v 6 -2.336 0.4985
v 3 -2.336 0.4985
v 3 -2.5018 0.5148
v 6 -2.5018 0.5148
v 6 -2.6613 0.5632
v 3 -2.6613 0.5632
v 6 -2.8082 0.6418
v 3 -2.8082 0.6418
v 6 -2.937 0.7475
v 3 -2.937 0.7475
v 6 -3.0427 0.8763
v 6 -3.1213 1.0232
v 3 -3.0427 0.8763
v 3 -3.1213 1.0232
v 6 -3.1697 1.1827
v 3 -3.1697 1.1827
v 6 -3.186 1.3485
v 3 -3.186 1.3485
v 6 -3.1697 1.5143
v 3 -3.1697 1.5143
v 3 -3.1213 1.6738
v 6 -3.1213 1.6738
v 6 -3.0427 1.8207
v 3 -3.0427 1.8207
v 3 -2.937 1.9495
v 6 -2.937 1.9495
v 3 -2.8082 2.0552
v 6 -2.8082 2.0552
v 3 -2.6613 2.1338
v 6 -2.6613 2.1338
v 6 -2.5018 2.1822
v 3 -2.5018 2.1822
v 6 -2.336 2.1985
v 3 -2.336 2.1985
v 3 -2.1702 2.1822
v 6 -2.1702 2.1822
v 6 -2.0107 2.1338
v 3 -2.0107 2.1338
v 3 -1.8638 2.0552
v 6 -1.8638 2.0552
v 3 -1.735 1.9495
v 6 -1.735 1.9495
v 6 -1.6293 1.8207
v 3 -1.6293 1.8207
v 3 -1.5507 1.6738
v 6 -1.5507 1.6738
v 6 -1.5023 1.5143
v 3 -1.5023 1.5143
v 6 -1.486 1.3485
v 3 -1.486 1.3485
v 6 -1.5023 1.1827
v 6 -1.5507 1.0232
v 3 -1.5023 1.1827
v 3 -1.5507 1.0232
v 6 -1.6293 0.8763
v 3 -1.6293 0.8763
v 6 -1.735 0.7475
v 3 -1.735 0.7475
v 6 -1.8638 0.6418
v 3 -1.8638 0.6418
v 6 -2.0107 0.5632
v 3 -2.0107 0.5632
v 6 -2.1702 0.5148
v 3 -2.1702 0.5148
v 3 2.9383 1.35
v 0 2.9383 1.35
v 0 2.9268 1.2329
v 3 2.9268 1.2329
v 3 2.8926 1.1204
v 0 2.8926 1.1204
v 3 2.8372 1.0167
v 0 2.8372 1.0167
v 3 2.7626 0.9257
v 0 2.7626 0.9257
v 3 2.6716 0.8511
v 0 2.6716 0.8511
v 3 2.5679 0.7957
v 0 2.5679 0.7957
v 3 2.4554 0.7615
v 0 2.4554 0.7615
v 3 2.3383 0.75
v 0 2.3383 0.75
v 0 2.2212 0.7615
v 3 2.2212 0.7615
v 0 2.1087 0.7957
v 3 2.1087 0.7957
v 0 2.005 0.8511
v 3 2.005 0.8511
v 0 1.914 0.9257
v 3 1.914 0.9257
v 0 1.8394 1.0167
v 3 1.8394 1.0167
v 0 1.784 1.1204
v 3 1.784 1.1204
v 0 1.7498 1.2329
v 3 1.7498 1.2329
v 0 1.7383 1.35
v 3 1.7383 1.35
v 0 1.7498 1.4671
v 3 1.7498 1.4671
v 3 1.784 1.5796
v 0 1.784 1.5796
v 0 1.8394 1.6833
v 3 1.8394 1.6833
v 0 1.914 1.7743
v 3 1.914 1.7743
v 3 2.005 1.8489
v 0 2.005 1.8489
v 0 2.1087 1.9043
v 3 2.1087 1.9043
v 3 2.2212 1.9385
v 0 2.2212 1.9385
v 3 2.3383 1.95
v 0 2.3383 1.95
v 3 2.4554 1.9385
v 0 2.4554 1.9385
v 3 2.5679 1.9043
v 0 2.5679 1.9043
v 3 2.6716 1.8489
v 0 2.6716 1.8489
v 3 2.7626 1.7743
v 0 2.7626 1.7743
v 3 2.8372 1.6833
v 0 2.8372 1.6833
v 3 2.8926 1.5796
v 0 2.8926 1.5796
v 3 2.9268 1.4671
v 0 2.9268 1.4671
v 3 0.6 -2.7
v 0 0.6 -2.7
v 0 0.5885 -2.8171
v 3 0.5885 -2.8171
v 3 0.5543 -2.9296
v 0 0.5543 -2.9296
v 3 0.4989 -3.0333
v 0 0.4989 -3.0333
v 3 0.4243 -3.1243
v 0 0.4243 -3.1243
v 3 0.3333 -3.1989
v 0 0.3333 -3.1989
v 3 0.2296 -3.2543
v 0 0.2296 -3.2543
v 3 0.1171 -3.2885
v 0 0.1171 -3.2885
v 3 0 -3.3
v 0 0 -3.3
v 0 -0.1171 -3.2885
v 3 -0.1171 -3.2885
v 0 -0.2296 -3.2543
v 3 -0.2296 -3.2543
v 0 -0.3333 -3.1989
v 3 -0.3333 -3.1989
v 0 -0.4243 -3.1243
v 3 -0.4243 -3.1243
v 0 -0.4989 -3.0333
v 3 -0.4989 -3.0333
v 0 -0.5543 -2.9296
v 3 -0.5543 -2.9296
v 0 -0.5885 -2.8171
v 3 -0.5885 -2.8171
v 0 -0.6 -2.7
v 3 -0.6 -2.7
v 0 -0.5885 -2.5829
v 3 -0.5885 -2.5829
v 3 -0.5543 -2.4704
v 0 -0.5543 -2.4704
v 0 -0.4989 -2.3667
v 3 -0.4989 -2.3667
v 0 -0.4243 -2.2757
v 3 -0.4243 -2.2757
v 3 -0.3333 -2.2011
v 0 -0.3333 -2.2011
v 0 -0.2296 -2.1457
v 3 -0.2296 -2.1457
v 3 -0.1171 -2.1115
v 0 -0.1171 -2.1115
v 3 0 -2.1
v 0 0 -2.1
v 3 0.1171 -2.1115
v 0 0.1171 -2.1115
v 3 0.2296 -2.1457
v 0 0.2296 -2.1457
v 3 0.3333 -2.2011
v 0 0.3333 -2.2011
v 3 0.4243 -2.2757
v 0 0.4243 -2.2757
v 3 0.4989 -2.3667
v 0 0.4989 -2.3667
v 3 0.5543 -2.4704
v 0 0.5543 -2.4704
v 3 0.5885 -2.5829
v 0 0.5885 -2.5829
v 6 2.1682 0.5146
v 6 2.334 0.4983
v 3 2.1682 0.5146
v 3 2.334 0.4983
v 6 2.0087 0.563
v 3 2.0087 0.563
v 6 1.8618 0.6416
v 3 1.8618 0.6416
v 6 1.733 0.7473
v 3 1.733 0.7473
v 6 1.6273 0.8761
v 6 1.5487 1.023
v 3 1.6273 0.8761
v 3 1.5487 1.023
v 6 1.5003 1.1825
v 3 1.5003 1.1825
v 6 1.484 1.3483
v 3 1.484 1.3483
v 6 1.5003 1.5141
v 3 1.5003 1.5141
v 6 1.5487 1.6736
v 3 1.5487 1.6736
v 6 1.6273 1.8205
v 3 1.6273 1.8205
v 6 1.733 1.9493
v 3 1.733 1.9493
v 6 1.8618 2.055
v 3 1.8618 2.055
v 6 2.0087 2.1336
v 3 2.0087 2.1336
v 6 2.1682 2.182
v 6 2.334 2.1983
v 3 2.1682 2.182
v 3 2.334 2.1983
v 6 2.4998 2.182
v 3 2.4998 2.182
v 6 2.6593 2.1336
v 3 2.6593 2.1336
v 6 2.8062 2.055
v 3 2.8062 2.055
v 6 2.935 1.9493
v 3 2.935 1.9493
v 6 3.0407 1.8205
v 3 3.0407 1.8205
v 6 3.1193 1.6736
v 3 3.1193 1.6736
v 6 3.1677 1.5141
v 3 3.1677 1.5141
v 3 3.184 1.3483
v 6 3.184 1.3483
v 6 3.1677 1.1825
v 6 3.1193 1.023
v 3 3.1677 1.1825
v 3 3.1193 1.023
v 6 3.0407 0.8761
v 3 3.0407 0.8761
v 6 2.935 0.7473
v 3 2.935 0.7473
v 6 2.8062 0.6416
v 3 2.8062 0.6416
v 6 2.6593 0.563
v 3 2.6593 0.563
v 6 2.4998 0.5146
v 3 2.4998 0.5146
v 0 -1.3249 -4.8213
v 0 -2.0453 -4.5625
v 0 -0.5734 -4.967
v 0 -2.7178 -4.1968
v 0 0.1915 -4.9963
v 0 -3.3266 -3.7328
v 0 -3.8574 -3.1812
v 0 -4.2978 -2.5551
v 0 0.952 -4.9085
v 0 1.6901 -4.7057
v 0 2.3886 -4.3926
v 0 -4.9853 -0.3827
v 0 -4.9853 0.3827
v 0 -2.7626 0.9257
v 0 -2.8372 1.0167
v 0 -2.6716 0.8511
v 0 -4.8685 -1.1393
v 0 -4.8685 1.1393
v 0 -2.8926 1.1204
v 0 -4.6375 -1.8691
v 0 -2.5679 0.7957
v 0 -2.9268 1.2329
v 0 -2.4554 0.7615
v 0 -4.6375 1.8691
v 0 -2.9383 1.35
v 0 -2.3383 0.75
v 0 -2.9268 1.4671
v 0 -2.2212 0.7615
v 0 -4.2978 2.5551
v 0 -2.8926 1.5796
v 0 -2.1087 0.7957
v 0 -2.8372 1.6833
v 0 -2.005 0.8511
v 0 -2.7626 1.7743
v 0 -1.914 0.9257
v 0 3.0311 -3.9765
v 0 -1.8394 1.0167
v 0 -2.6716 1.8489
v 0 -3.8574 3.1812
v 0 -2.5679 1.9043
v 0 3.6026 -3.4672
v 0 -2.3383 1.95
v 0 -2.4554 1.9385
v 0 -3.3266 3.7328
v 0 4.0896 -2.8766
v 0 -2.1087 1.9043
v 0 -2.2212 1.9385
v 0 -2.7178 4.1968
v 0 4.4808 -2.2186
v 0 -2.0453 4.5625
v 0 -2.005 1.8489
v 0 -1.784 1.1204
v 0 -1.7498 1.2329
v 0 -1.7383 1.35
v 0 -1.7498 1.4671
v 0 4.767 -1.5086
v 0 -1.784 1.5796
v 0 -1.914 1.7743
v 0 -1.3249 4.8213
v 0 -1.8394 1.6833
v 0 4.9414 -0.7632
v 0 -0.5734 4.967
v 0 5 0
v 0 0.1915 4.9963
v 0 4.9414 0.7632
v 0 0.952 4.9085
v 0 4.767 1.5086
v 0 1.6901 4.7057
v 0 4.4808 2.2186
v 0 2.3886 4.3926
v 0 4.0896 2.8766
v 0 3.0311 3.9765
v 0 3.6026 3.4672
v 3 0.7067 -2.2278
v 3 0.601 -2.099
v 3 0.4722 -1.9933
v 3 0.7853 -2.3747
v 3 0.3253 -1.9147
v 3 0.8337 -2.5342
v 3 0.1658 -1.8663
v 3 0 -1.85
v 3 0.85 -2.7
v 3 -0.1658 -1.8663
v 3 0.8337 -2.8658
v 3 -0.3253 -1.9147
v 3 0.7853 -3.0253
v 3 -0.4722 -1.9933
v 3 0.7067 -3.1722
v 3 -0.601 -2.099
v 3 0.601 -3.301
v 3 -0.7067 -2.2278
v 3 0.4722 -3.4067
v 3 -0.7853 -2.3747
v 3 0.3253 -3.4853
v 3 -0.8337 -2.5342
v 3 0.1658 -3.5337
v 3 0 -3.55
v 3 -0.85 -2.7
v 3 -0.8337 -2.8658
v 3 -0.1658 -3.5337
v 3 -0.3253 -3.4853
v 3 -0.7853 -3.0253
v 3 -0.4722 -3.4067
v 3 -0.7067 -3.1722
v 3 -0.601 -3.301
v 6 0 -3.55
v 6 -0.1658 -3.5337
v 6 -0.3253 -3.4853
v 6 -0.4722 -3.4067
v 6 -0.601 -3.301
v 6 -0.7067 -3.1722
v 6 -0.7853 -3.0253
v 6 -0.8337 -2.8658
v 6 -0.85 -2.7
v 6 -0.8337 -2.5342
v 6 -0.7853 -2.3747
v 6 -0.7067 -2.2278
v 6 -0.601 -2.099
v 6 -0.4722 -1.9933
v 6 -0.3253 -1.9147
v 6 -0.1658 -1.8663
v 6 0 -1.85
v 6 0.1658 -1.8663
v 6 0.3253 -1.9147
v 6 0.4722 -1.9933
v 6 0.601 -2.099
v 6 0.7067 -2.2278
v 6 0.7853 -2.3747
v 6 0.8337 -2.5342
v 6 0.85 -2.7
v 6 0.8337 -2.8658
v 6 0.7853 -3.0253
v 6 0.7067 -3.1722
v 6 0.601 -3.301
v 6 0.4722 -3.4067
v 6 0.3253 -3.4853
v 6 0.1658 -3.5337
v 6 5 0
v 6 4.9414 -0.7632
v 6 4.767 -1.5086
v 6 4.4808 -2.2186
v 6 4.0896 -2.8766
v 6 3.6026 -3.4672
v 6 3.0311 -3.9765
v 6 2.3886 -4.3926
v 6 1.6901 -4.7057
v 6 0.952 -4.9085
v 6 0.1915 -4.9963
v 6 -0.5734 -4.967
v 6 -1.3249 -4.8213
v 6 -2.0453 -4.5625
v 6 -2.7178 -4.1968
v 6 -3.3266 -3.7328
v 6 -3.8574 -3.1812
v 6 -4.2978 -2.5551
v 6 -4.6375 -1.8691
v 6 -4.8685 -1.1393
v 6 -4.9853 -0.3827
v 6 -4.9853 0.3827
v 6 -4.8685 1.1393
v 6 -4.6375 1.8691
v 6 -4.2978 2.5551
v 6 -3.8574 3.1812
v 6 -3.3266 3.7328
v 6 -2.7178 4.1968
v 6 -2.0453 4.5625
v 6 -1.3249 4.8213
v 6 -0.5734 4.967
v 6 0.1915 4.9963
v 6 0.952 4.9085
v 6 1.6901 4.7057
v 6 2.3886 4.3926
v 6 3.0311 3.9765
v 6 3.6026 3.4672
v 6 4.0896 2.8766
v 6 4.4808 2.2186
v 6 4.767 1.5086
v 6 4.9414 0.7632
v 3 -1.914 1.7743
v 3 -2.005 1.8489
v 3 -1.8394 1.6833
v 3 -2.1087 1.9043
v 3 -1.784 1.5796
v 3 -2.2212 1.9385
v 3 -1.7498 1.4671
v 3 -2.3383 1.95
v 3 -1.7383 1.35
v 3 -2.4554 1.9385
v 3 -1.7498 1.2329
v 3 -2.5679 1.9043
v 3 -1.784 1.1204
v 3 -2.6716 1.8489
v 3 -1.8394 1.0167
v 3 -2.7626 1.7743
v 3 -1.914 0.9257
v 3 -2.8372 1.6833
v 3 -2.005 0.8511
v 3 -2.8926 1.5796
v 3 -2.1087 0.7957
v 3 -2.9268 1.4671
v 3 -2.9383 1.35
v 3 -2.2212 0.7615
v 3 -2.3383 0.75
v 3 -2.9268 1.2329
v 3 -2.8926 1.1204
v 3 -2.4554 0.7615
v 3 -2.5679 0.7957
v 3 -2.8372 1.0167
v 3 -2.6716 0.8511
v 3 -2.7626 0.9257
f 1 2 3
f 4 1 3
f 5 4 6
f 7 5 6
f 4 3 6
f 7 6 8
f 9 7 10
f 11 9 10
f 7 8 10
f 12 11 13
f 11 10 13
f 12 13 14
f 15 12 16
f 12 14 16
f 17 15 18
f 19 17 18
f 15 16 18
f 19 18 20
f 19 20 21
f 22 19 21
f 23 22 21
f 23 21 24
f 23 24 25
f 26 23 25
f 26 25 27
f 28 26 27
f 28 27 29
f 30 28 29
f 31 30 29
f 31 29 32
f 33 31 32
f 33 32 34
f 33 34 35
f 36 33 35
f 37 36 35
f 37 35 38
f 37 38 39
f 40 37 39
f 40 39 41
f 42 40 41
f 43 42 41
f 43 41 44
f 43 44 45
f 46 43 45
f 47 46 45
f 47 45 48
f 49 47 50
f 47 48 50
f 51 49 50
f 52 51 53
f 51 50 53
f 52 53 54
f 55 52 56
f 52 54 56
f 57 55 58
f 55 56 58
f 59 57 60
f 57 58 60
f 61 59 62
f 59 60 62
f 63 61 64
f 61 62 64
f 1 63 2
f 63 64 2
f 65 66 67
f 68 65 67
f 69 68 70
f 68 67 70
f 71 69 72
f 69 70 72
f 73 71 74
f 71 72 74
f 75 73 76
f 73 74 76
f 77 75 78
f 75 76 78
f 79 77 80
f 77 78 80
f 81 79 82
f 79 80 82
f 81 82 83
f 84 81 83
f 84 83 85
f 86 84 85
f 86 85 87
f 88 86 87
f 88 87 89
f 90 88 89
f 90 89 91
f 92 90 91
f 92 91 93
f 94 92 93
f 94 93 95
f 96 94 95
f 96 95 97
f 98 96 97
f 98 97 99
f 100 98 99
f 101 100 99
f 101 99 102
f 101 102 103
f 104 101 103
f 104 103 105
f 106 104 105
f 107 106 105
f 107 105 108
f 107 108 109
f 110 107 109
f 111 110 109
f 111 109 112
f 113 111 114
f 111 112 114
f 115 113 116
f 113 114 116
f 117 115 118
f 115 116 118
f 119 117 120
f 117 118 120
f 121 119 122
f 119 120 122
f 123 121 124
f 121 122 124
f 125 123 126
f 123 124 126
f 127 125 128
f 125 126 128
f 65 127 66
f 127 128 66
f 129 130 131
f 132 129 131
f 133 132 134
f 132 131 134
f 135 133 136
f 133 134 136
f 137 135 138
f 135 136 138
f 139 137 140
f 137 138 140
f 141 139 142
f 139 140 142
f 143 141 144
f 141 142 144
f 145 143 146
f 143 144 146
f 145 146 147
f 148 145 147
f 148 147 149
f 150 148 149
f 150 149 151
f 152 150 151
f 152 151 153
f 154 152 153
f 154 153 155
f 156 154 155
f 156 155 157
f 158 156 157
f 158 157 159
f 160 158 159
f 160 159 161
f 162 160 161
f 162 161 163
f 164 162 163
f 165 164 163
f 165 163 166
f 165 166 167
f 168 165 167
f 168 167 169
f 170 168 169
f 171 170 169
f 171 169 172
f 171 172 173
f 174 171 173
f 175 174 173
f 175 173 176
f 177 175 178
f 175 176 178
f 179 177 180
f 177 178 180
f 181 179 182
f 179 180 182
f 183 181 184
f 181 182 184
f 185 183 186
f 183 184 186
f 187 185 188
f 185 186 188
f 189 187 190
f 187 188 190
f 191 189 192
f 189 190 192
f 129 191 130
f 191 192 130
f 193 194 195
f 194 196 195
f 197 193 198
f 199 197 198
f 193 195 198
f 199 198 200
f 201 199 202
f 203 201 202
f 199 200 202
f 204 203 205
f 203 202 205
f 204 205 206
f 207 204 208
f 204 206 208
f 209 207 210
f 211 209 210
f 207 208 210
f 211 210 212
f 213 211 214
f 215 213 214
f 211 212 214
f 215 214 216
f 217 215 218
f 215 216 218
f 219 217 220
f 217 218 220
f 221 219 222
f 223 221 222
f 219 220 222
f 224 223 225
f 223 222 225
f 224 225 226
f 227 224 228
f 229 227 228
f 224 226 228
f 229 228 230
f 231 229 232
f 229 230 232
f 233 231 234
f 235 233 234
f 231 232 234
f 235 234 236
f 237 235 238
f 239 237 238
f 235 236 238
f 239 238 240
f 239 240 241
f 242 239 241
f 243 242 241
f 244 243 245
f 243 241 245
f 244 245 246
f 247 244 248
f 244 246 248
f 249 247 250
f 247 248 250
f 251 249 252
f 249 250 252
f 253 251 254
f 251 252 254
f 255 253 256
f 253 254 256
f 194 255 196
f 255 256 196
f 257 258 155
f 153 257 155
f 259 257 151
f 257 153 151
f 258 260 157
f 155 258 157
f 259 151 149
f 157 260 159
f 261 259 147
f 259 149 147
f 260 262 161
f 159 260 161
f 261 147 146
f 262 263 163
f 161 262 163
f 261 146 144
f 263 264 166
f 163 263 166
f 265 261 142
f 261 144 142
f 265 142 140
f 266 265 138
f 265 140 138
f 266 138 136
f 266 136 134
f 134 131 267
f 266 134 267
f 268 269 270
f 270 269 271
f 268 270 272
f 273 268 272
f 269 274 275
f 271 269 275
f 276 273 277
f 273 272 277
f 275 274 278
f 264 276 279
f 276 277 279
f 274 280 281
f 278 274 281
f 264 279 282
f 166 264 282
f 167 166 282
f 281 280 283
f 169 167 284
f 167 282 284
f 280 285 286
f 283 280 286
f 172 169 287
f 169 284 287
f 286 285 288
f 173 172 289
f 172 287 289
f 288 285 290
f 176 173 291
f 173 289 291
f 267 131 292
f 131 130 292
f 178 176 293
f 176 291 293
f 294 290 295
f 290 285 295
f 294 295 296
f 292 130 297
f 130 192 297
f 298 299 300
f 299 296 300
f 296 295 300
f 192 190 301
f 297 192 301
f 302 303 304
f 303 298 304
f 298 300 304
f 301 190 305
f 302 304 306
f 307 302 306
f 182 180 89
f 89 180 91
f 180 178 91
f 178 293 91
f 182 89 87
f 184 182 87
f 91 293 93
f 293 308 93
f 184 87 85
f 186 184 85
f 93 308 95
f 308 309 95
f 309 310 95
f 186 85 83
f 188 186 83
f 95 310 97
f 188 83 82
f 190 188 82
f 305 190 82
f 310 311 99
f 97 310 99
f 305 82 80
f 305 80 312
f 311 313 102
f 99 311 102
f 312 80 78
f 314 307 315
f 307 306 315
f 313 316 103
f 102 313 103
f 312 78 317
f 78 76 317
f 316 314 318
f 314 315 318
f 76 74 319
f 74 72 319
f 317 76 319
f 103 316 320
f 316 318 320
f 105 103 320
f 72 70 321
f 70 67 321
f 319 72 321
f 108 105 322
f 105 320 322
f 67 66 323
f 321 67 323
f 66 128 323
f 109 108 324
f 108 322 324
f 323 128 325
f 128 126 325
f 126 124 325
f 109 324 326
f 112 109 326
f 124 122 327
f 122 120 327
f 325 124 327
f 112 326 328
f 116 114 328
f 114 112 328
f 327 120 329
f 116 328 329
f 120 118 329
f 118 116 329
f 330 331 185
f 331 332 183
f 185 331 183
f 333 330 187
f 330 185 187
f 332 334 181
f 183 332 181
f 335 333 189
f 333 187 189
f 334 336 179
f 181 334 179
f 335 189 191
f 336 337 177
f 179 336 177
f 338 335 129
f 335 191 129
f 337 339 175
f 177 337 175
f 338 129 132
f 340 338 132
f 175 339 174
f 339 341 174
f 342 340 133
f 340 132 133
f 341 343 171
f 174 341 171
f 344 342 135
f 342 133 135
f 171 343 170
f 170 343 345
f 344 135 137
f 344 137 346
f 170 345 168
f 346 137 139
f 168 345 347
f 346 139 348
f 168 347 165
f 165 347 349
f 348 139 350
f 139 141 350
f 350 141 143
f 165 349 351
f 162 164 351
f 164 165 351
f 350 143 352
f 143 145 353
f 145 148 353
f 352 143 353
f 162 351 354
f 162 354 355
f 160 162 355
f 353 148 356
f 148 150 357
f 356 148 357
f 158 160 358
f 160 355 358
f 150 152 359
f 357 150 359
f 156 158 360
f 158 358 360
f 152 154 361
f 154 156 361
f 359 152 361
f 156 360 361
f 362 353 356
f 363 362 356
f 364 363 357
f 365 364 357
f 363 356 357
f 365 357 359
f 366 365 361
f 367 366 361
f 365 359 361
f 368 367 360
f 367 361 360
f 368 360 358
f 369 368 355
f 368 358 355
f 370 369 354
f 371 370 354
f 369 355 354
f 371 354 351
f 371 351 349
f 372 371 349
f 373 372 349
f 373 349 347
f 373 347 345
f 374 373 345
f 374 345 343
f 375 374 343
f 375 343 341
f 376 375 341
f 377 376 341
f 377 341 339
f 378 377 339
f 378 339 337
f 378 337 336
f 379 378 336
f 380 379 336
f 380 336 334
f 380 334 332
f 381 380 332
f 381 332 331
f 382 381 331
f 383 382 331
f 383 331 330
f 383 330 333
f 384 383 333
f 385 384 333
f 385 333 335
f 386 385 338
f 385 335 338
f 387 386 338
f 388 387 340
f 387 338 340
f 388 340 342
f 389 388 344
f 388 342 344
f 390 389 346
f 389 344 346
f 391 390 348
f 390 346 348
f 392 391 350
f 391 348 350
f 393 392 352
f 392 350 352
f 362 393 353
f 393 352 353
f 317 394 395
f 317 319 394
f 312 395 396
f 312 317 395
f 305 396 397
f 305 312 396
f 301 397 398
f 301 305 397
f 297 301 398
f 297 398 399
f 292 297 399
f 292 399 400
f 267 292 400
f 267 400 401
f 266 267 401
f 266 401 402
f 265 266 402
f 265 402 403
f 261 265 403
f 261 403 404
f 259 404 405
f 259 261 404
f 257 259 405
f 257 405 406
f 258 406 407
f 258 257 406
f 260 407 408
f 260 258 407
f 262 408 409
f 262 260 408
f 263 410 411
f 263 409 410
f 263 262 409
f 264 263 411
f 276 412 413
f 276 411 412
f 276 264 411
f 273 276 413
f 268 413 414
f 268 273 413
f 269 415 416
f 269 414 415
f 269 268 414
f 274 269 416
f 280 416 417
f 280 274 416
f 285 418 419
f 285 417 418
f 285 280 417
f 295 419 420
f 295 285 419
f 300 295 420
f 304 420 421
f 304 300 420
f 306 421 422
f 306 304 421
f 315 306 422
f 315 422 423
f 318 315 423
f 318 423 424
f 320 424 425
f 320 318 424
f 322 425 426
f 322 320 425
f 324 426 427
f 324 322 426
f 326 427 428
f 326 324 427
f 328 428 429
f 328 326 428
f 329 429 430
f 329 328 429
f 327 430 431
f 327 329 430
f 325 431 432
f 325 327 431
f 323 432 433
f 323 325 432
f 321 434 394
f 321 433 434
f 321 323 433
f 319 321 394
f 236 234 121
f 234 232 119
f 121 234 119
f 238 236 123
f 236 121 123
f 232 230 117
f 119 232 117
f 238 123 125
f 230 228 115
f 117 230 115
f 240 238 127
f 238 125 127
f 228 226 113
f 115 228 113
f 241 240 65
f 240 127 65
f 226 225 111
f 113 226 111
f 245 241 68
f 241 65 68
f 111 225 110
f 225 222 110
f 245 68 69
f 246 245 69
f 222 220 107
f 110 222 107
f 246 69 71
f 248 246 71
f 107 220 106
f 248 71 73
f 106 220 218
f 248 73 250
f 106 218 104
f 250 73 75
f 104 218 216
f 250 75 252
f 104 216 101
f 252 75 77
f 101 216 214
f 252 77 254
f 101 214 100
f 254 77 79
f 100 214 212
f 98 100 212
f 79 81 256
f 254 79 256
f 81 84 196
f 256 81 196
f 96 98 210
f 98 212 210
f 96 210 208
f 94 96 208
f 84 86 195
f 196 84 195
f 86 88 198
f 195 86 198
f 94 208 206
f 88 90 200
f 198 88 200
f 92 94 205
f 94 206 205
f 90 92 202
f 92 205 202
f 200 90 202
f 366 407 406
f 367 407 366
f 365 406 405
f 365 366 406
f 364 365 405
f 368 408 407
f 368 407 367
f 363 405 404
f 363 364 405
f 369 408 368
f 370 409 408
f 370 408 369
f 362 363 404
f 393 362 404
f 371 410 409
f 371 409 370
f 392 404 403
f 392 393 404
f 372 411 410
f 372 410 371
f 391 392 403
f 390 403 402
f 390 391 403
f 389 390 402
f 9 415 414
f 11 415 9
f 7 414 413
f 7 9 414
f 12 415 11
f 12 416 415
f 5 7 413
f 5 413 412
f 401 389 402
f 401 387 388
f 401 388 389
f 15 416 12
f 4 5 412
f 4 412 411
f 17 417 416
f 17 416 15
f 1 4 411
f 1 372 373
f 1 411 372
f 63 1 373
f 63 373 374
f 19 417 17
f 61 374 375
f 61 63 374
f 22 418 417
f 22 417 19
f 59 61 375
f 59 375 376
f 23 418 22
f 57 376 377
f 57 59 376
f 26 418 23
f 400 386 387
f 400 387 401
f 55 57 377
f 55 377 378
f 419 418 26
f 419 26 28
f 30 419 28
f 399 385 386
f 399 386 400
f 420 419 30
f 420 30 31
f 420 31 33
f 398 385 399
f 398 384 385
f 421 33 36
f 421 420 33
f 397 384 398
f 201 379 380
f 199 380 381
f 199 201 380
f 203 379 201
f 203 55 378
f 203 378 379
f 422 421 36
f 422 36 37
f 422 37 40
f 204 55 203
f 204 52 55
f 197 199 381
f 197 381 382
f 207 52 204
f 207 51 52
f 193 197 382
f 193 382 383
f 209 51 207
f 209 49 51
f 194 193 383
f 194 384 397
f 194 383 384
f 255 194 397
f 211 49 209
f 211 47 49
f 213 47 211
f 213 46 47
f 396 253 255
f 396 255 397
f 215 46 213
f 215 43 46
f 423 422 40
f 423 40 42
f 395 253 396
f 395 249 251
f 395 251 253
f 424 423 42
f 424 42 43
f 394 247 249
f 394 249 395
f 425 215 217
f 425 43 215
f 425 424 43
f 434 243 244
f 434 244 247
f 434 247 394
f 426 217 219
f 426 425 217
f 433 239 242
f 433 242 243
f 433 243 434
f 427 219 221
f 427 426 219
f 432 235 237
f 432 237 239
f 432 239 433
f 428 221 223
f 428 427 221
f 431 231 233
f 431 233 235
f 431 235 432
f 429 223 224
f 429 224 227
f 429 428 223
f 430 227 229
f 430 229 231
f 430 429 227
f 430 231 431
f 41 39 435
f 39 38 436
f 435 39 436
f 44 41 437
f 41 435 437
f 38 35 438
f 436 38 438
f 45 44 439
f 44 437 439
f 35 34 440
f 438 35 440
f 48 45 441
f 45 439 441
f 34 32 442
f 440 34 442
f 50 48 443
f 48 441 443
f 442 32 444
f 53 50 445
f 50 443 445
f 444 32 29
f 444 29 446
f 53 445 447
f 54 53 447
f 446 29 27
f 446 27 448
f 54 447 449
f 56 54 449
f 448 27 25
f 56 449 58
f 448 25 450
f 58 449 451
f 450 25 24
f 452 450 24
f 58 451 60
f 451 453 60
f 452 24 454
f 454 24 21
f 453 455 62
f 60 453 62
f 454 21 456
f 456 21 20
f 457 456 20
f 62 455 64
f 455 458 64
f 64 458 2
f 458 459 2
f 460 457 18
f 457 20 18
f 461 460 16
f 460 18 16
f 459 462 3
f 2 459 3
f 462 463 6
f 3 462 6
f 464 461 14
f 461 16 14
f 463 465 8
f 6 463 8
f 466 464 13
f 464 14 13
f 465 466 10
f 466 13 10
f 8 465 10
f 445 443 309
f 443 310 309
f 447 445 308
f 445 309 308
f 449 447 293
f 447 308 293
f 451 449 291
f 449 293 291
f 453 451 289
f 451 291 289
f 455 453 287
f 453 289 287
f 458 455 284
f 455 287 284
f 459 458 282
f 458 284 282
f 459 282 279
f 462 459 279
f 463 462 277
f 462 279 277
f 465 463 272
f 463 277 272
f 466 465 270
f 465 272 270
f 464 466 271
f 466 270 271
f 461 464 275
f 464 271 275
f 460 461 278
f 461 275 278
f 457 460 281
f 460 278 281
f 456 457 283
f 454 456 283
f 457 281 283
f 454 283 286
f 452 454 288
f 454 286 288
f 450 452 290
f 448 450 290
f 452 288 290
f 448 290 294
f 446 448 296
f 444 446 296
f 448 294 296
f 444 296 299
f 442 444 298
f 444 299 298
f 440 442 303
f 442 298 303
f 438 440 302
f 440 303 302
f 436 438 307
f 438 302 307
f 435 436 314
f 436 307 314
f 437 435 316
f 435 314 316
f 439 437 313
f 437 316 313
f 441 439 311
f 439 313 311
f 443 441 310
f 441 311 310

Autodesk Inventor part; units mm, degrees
ref_plane "YZ Plane" through (0, 0, 0) normal (1, 0, 0) x (0, 1, 0)
ref_plane "XZ Plane" through (0, 0, 0) normal (0, 1, 0) x (-1, 0, 0)
ref_plane "XY Plane" through (0, 0, 0) normal (0, 0, 1) x (1, 0, 0)
sketch "Эскиз1" plane through (0, 0, 0) normal (1, 0, 0) x (0, 1, 0)
  circle A0 centre (0, 0) radius 5
  circle A1 centre (0, -2.7) radius 0.6
  circle A2 centre (0, 0) radius 2.7 construction
  circle A3 centre (-2.3383, 1.35) radius 0.6
  circle A4 centre (2.3383, 1.35) radius 0.6
  line L0 (0, 0) -> (5.4782, 3.1628) construction
  line L1 (0, 0) -> (-5.2011, 3.0029) construction
  line L2 (0, 0) -> (5.5612, 0) construction
  dimension "d1" = 10
  dimension "d3" = 1.2
  dimension "d24" = 5.4
  dimension "d25" = 1.2
  dimension "d26" = 1.2
  dimension "d53" = 120
  dimension "d54" = 30
extrude "Выдавливание1" add sketch "Эскиз1" along normal blind 6 contours A0 | A3 | A4
hole "Отверстие2" at (6, 0, -2.7) direction (-1, 0, 0) diameter 1.7 depth 3
extrude "Выдавливание2" cut sketch "Эскиз1" along normal blind 6 contours A3 | A4
sketch "Эскиз2" plane through (6, 0, 0) normal (1, 0, 0) x (0, 0, -1)
  point P0 (0, 0)
  point P1 (-1.3483, 2.334)
hole "Отверстие4" at (6, 2.334, 1.3483) direction (-1, 0, 0) diameter 1.7 depth 3
sketch "Эскиз3" plane through (6, 0, 0) normal (1, 0, 0) x (0, 0, -1)
  point P0 (0, 0)
  point P1 (-1.3485, -2.336)
hole "Отверстие5" at (6, -2.336, 1.3485) direction (-1, 0, 0) diameter 1.7 depth 3
equation "\"d1\" = inside"
equation "\"d3\" = 2 * pin_small_rad"
equation "\"d17\" = pin_big_dia"
equation "\"inside\" = 10"
equation "\"pin_small_rad\" = 0.6"
equation "\"pin_big_dia\" = 1.7"
properties part number "каркас" material "Пластмасса, непрозрачная, черная"
